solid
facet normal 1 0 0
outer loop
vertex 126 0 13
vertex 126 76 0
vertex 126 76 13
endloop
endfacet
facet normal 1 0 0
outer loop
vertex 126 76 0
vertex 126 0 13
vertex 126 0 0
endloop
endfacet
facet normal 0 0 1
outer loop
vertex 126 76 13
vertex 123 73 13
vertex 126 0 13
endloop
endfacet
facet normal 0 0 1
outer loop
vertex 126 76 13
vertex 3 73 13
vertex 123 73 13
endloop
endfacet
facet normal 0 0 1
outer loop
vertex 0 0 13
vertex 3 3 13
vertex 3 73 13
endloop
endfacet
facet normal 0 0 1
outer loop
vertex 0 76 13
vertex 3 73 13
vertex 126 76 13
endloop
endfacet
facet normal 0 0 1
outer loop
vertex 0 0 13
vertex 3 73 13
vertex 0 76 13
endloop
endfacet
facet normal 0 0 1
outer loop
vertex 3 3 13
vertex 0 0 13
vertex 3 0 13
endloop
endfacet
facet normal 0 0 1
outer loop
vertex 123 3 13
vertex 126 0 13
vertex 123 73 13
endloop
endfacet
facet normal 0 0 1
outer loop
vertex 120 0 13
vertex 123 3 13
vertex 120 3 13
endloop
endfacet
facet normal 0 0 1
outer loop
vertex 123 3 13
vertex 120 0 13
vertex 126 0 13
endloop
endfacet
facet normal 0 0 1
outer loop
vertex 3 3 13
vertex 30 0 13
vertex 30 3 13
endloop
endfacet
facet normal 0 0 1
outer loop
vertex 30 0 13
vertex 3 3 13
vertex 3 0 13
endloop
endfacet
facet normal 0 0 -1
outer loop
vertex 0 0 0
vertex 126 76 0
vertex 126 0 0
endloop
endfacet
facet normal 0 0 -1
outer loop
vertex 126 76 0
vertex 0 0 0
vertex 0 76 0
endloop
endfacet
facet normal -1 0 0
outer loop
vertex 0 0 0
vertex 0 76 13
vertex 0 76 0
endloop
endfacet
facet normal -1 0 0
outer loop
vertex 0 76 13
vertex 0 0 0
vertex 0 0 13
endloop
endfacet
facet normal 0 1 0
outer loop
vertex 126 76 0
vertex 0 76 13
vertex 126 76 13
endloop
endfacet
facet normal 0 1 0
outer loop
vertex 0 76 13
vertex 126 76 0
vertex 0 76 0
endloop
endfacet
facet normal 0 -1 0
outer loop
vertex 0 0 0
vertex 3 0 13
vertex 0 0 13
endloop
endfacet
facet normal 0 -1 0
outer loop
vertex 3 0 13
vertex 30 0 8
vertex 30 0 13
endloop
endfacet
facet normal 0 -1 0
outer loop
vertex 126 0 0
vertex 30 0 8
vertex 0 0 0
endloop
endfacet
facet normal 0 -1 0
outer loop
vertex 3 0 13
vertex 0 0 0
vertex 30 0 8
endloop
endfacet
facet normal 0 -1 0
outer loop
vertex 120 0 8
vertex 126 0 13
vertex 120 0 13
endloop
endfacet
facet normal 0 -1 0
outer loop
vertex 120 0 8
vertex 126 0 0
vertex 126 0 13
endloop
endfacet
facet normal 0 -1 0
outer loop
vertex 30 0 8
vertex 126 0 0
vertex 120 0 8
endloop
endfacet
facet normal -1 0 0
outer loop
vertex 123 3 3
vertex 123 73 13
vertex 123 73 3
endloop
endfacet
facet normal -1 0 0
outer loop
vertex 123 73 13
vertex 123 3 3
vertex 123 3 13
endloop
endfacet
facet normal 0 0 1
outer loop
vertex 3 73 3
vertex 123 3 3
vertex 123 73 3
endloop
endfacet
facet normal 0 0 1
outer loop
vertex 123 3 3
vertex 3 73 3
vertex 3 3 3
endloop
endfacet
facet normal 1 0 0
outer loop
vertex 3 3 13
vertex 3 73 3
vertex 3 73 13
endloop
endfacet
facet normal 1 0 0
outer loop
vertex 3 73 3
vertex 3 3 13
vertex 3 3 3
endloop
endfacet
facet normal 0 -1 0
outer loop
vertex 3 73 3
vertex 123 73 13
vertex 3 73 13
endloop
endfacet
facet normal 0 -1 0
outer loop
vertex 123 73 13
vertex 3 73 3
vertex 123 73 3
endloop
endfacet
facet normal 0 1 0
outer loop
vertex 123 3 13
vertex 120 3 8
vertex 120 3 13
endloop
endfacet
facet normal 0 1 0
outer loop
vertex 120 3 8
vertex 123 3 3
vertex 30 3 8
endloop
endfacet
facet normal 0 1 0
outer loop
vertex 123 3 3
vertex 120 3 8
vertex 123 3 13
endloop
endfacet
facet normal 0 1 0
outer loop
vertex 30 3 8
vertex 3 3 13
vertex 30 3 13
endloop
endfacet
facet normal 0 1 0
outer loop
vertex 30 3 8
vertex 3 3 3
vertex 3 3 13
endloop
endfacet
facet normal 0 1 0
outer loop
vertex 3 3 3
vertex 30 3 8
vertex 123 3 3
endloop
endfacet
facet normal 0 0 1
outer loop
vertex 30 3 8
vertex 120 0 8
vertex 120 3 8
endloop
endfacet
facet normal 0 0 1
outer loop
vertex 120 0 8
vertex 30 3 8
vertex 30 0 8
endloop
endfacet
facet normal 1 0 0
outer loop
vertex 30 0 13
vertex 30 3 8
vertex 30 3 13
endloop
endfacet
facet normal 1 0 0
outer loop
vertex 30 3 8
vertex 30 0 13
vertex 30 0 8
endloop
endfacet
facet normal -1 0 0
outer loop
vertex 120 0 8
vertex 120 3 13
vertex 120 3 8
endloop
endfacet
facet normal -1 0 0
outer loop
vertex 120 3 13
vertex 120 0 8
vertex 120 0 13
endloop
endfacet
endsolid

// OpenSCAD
// Buffer tank for a mini horizontal gel-electrophoresis box. Open top, rectangular shape with a
// central raised platform and two buffer chambers. NOVEL general part.
//

inner_X = 120;
inner_Y = 70;
inner_Z = 40;
wall    = 3;
floor   = 3;
platform  = 60;
height    = 10;

$fn = 32;

difference() {
    cube([inner_X + 2 * wall, inner_Y + 2 * wall, height + wall]);
    translate([wall, wall, wall]) cube([inner_X, inner_Y, height]);
    z = height - height / 2 + wall;                 // platform centre z (top of the lower wall)
    translate([(inner_X - platform) / 2, 0, z]) cube([platform, inner_Y, height / 2]);   // left chamber
    translate([inner_X / 2, 0, z]) cube([platform, inner_Y, height / 2]);                 // right chamber
    for (x = [wall, inner_X - wall])
        translate([x, -1, height + wall * 0.5]) cylinder(h = wall, d = 2, center = true);   // electrode holes
}
